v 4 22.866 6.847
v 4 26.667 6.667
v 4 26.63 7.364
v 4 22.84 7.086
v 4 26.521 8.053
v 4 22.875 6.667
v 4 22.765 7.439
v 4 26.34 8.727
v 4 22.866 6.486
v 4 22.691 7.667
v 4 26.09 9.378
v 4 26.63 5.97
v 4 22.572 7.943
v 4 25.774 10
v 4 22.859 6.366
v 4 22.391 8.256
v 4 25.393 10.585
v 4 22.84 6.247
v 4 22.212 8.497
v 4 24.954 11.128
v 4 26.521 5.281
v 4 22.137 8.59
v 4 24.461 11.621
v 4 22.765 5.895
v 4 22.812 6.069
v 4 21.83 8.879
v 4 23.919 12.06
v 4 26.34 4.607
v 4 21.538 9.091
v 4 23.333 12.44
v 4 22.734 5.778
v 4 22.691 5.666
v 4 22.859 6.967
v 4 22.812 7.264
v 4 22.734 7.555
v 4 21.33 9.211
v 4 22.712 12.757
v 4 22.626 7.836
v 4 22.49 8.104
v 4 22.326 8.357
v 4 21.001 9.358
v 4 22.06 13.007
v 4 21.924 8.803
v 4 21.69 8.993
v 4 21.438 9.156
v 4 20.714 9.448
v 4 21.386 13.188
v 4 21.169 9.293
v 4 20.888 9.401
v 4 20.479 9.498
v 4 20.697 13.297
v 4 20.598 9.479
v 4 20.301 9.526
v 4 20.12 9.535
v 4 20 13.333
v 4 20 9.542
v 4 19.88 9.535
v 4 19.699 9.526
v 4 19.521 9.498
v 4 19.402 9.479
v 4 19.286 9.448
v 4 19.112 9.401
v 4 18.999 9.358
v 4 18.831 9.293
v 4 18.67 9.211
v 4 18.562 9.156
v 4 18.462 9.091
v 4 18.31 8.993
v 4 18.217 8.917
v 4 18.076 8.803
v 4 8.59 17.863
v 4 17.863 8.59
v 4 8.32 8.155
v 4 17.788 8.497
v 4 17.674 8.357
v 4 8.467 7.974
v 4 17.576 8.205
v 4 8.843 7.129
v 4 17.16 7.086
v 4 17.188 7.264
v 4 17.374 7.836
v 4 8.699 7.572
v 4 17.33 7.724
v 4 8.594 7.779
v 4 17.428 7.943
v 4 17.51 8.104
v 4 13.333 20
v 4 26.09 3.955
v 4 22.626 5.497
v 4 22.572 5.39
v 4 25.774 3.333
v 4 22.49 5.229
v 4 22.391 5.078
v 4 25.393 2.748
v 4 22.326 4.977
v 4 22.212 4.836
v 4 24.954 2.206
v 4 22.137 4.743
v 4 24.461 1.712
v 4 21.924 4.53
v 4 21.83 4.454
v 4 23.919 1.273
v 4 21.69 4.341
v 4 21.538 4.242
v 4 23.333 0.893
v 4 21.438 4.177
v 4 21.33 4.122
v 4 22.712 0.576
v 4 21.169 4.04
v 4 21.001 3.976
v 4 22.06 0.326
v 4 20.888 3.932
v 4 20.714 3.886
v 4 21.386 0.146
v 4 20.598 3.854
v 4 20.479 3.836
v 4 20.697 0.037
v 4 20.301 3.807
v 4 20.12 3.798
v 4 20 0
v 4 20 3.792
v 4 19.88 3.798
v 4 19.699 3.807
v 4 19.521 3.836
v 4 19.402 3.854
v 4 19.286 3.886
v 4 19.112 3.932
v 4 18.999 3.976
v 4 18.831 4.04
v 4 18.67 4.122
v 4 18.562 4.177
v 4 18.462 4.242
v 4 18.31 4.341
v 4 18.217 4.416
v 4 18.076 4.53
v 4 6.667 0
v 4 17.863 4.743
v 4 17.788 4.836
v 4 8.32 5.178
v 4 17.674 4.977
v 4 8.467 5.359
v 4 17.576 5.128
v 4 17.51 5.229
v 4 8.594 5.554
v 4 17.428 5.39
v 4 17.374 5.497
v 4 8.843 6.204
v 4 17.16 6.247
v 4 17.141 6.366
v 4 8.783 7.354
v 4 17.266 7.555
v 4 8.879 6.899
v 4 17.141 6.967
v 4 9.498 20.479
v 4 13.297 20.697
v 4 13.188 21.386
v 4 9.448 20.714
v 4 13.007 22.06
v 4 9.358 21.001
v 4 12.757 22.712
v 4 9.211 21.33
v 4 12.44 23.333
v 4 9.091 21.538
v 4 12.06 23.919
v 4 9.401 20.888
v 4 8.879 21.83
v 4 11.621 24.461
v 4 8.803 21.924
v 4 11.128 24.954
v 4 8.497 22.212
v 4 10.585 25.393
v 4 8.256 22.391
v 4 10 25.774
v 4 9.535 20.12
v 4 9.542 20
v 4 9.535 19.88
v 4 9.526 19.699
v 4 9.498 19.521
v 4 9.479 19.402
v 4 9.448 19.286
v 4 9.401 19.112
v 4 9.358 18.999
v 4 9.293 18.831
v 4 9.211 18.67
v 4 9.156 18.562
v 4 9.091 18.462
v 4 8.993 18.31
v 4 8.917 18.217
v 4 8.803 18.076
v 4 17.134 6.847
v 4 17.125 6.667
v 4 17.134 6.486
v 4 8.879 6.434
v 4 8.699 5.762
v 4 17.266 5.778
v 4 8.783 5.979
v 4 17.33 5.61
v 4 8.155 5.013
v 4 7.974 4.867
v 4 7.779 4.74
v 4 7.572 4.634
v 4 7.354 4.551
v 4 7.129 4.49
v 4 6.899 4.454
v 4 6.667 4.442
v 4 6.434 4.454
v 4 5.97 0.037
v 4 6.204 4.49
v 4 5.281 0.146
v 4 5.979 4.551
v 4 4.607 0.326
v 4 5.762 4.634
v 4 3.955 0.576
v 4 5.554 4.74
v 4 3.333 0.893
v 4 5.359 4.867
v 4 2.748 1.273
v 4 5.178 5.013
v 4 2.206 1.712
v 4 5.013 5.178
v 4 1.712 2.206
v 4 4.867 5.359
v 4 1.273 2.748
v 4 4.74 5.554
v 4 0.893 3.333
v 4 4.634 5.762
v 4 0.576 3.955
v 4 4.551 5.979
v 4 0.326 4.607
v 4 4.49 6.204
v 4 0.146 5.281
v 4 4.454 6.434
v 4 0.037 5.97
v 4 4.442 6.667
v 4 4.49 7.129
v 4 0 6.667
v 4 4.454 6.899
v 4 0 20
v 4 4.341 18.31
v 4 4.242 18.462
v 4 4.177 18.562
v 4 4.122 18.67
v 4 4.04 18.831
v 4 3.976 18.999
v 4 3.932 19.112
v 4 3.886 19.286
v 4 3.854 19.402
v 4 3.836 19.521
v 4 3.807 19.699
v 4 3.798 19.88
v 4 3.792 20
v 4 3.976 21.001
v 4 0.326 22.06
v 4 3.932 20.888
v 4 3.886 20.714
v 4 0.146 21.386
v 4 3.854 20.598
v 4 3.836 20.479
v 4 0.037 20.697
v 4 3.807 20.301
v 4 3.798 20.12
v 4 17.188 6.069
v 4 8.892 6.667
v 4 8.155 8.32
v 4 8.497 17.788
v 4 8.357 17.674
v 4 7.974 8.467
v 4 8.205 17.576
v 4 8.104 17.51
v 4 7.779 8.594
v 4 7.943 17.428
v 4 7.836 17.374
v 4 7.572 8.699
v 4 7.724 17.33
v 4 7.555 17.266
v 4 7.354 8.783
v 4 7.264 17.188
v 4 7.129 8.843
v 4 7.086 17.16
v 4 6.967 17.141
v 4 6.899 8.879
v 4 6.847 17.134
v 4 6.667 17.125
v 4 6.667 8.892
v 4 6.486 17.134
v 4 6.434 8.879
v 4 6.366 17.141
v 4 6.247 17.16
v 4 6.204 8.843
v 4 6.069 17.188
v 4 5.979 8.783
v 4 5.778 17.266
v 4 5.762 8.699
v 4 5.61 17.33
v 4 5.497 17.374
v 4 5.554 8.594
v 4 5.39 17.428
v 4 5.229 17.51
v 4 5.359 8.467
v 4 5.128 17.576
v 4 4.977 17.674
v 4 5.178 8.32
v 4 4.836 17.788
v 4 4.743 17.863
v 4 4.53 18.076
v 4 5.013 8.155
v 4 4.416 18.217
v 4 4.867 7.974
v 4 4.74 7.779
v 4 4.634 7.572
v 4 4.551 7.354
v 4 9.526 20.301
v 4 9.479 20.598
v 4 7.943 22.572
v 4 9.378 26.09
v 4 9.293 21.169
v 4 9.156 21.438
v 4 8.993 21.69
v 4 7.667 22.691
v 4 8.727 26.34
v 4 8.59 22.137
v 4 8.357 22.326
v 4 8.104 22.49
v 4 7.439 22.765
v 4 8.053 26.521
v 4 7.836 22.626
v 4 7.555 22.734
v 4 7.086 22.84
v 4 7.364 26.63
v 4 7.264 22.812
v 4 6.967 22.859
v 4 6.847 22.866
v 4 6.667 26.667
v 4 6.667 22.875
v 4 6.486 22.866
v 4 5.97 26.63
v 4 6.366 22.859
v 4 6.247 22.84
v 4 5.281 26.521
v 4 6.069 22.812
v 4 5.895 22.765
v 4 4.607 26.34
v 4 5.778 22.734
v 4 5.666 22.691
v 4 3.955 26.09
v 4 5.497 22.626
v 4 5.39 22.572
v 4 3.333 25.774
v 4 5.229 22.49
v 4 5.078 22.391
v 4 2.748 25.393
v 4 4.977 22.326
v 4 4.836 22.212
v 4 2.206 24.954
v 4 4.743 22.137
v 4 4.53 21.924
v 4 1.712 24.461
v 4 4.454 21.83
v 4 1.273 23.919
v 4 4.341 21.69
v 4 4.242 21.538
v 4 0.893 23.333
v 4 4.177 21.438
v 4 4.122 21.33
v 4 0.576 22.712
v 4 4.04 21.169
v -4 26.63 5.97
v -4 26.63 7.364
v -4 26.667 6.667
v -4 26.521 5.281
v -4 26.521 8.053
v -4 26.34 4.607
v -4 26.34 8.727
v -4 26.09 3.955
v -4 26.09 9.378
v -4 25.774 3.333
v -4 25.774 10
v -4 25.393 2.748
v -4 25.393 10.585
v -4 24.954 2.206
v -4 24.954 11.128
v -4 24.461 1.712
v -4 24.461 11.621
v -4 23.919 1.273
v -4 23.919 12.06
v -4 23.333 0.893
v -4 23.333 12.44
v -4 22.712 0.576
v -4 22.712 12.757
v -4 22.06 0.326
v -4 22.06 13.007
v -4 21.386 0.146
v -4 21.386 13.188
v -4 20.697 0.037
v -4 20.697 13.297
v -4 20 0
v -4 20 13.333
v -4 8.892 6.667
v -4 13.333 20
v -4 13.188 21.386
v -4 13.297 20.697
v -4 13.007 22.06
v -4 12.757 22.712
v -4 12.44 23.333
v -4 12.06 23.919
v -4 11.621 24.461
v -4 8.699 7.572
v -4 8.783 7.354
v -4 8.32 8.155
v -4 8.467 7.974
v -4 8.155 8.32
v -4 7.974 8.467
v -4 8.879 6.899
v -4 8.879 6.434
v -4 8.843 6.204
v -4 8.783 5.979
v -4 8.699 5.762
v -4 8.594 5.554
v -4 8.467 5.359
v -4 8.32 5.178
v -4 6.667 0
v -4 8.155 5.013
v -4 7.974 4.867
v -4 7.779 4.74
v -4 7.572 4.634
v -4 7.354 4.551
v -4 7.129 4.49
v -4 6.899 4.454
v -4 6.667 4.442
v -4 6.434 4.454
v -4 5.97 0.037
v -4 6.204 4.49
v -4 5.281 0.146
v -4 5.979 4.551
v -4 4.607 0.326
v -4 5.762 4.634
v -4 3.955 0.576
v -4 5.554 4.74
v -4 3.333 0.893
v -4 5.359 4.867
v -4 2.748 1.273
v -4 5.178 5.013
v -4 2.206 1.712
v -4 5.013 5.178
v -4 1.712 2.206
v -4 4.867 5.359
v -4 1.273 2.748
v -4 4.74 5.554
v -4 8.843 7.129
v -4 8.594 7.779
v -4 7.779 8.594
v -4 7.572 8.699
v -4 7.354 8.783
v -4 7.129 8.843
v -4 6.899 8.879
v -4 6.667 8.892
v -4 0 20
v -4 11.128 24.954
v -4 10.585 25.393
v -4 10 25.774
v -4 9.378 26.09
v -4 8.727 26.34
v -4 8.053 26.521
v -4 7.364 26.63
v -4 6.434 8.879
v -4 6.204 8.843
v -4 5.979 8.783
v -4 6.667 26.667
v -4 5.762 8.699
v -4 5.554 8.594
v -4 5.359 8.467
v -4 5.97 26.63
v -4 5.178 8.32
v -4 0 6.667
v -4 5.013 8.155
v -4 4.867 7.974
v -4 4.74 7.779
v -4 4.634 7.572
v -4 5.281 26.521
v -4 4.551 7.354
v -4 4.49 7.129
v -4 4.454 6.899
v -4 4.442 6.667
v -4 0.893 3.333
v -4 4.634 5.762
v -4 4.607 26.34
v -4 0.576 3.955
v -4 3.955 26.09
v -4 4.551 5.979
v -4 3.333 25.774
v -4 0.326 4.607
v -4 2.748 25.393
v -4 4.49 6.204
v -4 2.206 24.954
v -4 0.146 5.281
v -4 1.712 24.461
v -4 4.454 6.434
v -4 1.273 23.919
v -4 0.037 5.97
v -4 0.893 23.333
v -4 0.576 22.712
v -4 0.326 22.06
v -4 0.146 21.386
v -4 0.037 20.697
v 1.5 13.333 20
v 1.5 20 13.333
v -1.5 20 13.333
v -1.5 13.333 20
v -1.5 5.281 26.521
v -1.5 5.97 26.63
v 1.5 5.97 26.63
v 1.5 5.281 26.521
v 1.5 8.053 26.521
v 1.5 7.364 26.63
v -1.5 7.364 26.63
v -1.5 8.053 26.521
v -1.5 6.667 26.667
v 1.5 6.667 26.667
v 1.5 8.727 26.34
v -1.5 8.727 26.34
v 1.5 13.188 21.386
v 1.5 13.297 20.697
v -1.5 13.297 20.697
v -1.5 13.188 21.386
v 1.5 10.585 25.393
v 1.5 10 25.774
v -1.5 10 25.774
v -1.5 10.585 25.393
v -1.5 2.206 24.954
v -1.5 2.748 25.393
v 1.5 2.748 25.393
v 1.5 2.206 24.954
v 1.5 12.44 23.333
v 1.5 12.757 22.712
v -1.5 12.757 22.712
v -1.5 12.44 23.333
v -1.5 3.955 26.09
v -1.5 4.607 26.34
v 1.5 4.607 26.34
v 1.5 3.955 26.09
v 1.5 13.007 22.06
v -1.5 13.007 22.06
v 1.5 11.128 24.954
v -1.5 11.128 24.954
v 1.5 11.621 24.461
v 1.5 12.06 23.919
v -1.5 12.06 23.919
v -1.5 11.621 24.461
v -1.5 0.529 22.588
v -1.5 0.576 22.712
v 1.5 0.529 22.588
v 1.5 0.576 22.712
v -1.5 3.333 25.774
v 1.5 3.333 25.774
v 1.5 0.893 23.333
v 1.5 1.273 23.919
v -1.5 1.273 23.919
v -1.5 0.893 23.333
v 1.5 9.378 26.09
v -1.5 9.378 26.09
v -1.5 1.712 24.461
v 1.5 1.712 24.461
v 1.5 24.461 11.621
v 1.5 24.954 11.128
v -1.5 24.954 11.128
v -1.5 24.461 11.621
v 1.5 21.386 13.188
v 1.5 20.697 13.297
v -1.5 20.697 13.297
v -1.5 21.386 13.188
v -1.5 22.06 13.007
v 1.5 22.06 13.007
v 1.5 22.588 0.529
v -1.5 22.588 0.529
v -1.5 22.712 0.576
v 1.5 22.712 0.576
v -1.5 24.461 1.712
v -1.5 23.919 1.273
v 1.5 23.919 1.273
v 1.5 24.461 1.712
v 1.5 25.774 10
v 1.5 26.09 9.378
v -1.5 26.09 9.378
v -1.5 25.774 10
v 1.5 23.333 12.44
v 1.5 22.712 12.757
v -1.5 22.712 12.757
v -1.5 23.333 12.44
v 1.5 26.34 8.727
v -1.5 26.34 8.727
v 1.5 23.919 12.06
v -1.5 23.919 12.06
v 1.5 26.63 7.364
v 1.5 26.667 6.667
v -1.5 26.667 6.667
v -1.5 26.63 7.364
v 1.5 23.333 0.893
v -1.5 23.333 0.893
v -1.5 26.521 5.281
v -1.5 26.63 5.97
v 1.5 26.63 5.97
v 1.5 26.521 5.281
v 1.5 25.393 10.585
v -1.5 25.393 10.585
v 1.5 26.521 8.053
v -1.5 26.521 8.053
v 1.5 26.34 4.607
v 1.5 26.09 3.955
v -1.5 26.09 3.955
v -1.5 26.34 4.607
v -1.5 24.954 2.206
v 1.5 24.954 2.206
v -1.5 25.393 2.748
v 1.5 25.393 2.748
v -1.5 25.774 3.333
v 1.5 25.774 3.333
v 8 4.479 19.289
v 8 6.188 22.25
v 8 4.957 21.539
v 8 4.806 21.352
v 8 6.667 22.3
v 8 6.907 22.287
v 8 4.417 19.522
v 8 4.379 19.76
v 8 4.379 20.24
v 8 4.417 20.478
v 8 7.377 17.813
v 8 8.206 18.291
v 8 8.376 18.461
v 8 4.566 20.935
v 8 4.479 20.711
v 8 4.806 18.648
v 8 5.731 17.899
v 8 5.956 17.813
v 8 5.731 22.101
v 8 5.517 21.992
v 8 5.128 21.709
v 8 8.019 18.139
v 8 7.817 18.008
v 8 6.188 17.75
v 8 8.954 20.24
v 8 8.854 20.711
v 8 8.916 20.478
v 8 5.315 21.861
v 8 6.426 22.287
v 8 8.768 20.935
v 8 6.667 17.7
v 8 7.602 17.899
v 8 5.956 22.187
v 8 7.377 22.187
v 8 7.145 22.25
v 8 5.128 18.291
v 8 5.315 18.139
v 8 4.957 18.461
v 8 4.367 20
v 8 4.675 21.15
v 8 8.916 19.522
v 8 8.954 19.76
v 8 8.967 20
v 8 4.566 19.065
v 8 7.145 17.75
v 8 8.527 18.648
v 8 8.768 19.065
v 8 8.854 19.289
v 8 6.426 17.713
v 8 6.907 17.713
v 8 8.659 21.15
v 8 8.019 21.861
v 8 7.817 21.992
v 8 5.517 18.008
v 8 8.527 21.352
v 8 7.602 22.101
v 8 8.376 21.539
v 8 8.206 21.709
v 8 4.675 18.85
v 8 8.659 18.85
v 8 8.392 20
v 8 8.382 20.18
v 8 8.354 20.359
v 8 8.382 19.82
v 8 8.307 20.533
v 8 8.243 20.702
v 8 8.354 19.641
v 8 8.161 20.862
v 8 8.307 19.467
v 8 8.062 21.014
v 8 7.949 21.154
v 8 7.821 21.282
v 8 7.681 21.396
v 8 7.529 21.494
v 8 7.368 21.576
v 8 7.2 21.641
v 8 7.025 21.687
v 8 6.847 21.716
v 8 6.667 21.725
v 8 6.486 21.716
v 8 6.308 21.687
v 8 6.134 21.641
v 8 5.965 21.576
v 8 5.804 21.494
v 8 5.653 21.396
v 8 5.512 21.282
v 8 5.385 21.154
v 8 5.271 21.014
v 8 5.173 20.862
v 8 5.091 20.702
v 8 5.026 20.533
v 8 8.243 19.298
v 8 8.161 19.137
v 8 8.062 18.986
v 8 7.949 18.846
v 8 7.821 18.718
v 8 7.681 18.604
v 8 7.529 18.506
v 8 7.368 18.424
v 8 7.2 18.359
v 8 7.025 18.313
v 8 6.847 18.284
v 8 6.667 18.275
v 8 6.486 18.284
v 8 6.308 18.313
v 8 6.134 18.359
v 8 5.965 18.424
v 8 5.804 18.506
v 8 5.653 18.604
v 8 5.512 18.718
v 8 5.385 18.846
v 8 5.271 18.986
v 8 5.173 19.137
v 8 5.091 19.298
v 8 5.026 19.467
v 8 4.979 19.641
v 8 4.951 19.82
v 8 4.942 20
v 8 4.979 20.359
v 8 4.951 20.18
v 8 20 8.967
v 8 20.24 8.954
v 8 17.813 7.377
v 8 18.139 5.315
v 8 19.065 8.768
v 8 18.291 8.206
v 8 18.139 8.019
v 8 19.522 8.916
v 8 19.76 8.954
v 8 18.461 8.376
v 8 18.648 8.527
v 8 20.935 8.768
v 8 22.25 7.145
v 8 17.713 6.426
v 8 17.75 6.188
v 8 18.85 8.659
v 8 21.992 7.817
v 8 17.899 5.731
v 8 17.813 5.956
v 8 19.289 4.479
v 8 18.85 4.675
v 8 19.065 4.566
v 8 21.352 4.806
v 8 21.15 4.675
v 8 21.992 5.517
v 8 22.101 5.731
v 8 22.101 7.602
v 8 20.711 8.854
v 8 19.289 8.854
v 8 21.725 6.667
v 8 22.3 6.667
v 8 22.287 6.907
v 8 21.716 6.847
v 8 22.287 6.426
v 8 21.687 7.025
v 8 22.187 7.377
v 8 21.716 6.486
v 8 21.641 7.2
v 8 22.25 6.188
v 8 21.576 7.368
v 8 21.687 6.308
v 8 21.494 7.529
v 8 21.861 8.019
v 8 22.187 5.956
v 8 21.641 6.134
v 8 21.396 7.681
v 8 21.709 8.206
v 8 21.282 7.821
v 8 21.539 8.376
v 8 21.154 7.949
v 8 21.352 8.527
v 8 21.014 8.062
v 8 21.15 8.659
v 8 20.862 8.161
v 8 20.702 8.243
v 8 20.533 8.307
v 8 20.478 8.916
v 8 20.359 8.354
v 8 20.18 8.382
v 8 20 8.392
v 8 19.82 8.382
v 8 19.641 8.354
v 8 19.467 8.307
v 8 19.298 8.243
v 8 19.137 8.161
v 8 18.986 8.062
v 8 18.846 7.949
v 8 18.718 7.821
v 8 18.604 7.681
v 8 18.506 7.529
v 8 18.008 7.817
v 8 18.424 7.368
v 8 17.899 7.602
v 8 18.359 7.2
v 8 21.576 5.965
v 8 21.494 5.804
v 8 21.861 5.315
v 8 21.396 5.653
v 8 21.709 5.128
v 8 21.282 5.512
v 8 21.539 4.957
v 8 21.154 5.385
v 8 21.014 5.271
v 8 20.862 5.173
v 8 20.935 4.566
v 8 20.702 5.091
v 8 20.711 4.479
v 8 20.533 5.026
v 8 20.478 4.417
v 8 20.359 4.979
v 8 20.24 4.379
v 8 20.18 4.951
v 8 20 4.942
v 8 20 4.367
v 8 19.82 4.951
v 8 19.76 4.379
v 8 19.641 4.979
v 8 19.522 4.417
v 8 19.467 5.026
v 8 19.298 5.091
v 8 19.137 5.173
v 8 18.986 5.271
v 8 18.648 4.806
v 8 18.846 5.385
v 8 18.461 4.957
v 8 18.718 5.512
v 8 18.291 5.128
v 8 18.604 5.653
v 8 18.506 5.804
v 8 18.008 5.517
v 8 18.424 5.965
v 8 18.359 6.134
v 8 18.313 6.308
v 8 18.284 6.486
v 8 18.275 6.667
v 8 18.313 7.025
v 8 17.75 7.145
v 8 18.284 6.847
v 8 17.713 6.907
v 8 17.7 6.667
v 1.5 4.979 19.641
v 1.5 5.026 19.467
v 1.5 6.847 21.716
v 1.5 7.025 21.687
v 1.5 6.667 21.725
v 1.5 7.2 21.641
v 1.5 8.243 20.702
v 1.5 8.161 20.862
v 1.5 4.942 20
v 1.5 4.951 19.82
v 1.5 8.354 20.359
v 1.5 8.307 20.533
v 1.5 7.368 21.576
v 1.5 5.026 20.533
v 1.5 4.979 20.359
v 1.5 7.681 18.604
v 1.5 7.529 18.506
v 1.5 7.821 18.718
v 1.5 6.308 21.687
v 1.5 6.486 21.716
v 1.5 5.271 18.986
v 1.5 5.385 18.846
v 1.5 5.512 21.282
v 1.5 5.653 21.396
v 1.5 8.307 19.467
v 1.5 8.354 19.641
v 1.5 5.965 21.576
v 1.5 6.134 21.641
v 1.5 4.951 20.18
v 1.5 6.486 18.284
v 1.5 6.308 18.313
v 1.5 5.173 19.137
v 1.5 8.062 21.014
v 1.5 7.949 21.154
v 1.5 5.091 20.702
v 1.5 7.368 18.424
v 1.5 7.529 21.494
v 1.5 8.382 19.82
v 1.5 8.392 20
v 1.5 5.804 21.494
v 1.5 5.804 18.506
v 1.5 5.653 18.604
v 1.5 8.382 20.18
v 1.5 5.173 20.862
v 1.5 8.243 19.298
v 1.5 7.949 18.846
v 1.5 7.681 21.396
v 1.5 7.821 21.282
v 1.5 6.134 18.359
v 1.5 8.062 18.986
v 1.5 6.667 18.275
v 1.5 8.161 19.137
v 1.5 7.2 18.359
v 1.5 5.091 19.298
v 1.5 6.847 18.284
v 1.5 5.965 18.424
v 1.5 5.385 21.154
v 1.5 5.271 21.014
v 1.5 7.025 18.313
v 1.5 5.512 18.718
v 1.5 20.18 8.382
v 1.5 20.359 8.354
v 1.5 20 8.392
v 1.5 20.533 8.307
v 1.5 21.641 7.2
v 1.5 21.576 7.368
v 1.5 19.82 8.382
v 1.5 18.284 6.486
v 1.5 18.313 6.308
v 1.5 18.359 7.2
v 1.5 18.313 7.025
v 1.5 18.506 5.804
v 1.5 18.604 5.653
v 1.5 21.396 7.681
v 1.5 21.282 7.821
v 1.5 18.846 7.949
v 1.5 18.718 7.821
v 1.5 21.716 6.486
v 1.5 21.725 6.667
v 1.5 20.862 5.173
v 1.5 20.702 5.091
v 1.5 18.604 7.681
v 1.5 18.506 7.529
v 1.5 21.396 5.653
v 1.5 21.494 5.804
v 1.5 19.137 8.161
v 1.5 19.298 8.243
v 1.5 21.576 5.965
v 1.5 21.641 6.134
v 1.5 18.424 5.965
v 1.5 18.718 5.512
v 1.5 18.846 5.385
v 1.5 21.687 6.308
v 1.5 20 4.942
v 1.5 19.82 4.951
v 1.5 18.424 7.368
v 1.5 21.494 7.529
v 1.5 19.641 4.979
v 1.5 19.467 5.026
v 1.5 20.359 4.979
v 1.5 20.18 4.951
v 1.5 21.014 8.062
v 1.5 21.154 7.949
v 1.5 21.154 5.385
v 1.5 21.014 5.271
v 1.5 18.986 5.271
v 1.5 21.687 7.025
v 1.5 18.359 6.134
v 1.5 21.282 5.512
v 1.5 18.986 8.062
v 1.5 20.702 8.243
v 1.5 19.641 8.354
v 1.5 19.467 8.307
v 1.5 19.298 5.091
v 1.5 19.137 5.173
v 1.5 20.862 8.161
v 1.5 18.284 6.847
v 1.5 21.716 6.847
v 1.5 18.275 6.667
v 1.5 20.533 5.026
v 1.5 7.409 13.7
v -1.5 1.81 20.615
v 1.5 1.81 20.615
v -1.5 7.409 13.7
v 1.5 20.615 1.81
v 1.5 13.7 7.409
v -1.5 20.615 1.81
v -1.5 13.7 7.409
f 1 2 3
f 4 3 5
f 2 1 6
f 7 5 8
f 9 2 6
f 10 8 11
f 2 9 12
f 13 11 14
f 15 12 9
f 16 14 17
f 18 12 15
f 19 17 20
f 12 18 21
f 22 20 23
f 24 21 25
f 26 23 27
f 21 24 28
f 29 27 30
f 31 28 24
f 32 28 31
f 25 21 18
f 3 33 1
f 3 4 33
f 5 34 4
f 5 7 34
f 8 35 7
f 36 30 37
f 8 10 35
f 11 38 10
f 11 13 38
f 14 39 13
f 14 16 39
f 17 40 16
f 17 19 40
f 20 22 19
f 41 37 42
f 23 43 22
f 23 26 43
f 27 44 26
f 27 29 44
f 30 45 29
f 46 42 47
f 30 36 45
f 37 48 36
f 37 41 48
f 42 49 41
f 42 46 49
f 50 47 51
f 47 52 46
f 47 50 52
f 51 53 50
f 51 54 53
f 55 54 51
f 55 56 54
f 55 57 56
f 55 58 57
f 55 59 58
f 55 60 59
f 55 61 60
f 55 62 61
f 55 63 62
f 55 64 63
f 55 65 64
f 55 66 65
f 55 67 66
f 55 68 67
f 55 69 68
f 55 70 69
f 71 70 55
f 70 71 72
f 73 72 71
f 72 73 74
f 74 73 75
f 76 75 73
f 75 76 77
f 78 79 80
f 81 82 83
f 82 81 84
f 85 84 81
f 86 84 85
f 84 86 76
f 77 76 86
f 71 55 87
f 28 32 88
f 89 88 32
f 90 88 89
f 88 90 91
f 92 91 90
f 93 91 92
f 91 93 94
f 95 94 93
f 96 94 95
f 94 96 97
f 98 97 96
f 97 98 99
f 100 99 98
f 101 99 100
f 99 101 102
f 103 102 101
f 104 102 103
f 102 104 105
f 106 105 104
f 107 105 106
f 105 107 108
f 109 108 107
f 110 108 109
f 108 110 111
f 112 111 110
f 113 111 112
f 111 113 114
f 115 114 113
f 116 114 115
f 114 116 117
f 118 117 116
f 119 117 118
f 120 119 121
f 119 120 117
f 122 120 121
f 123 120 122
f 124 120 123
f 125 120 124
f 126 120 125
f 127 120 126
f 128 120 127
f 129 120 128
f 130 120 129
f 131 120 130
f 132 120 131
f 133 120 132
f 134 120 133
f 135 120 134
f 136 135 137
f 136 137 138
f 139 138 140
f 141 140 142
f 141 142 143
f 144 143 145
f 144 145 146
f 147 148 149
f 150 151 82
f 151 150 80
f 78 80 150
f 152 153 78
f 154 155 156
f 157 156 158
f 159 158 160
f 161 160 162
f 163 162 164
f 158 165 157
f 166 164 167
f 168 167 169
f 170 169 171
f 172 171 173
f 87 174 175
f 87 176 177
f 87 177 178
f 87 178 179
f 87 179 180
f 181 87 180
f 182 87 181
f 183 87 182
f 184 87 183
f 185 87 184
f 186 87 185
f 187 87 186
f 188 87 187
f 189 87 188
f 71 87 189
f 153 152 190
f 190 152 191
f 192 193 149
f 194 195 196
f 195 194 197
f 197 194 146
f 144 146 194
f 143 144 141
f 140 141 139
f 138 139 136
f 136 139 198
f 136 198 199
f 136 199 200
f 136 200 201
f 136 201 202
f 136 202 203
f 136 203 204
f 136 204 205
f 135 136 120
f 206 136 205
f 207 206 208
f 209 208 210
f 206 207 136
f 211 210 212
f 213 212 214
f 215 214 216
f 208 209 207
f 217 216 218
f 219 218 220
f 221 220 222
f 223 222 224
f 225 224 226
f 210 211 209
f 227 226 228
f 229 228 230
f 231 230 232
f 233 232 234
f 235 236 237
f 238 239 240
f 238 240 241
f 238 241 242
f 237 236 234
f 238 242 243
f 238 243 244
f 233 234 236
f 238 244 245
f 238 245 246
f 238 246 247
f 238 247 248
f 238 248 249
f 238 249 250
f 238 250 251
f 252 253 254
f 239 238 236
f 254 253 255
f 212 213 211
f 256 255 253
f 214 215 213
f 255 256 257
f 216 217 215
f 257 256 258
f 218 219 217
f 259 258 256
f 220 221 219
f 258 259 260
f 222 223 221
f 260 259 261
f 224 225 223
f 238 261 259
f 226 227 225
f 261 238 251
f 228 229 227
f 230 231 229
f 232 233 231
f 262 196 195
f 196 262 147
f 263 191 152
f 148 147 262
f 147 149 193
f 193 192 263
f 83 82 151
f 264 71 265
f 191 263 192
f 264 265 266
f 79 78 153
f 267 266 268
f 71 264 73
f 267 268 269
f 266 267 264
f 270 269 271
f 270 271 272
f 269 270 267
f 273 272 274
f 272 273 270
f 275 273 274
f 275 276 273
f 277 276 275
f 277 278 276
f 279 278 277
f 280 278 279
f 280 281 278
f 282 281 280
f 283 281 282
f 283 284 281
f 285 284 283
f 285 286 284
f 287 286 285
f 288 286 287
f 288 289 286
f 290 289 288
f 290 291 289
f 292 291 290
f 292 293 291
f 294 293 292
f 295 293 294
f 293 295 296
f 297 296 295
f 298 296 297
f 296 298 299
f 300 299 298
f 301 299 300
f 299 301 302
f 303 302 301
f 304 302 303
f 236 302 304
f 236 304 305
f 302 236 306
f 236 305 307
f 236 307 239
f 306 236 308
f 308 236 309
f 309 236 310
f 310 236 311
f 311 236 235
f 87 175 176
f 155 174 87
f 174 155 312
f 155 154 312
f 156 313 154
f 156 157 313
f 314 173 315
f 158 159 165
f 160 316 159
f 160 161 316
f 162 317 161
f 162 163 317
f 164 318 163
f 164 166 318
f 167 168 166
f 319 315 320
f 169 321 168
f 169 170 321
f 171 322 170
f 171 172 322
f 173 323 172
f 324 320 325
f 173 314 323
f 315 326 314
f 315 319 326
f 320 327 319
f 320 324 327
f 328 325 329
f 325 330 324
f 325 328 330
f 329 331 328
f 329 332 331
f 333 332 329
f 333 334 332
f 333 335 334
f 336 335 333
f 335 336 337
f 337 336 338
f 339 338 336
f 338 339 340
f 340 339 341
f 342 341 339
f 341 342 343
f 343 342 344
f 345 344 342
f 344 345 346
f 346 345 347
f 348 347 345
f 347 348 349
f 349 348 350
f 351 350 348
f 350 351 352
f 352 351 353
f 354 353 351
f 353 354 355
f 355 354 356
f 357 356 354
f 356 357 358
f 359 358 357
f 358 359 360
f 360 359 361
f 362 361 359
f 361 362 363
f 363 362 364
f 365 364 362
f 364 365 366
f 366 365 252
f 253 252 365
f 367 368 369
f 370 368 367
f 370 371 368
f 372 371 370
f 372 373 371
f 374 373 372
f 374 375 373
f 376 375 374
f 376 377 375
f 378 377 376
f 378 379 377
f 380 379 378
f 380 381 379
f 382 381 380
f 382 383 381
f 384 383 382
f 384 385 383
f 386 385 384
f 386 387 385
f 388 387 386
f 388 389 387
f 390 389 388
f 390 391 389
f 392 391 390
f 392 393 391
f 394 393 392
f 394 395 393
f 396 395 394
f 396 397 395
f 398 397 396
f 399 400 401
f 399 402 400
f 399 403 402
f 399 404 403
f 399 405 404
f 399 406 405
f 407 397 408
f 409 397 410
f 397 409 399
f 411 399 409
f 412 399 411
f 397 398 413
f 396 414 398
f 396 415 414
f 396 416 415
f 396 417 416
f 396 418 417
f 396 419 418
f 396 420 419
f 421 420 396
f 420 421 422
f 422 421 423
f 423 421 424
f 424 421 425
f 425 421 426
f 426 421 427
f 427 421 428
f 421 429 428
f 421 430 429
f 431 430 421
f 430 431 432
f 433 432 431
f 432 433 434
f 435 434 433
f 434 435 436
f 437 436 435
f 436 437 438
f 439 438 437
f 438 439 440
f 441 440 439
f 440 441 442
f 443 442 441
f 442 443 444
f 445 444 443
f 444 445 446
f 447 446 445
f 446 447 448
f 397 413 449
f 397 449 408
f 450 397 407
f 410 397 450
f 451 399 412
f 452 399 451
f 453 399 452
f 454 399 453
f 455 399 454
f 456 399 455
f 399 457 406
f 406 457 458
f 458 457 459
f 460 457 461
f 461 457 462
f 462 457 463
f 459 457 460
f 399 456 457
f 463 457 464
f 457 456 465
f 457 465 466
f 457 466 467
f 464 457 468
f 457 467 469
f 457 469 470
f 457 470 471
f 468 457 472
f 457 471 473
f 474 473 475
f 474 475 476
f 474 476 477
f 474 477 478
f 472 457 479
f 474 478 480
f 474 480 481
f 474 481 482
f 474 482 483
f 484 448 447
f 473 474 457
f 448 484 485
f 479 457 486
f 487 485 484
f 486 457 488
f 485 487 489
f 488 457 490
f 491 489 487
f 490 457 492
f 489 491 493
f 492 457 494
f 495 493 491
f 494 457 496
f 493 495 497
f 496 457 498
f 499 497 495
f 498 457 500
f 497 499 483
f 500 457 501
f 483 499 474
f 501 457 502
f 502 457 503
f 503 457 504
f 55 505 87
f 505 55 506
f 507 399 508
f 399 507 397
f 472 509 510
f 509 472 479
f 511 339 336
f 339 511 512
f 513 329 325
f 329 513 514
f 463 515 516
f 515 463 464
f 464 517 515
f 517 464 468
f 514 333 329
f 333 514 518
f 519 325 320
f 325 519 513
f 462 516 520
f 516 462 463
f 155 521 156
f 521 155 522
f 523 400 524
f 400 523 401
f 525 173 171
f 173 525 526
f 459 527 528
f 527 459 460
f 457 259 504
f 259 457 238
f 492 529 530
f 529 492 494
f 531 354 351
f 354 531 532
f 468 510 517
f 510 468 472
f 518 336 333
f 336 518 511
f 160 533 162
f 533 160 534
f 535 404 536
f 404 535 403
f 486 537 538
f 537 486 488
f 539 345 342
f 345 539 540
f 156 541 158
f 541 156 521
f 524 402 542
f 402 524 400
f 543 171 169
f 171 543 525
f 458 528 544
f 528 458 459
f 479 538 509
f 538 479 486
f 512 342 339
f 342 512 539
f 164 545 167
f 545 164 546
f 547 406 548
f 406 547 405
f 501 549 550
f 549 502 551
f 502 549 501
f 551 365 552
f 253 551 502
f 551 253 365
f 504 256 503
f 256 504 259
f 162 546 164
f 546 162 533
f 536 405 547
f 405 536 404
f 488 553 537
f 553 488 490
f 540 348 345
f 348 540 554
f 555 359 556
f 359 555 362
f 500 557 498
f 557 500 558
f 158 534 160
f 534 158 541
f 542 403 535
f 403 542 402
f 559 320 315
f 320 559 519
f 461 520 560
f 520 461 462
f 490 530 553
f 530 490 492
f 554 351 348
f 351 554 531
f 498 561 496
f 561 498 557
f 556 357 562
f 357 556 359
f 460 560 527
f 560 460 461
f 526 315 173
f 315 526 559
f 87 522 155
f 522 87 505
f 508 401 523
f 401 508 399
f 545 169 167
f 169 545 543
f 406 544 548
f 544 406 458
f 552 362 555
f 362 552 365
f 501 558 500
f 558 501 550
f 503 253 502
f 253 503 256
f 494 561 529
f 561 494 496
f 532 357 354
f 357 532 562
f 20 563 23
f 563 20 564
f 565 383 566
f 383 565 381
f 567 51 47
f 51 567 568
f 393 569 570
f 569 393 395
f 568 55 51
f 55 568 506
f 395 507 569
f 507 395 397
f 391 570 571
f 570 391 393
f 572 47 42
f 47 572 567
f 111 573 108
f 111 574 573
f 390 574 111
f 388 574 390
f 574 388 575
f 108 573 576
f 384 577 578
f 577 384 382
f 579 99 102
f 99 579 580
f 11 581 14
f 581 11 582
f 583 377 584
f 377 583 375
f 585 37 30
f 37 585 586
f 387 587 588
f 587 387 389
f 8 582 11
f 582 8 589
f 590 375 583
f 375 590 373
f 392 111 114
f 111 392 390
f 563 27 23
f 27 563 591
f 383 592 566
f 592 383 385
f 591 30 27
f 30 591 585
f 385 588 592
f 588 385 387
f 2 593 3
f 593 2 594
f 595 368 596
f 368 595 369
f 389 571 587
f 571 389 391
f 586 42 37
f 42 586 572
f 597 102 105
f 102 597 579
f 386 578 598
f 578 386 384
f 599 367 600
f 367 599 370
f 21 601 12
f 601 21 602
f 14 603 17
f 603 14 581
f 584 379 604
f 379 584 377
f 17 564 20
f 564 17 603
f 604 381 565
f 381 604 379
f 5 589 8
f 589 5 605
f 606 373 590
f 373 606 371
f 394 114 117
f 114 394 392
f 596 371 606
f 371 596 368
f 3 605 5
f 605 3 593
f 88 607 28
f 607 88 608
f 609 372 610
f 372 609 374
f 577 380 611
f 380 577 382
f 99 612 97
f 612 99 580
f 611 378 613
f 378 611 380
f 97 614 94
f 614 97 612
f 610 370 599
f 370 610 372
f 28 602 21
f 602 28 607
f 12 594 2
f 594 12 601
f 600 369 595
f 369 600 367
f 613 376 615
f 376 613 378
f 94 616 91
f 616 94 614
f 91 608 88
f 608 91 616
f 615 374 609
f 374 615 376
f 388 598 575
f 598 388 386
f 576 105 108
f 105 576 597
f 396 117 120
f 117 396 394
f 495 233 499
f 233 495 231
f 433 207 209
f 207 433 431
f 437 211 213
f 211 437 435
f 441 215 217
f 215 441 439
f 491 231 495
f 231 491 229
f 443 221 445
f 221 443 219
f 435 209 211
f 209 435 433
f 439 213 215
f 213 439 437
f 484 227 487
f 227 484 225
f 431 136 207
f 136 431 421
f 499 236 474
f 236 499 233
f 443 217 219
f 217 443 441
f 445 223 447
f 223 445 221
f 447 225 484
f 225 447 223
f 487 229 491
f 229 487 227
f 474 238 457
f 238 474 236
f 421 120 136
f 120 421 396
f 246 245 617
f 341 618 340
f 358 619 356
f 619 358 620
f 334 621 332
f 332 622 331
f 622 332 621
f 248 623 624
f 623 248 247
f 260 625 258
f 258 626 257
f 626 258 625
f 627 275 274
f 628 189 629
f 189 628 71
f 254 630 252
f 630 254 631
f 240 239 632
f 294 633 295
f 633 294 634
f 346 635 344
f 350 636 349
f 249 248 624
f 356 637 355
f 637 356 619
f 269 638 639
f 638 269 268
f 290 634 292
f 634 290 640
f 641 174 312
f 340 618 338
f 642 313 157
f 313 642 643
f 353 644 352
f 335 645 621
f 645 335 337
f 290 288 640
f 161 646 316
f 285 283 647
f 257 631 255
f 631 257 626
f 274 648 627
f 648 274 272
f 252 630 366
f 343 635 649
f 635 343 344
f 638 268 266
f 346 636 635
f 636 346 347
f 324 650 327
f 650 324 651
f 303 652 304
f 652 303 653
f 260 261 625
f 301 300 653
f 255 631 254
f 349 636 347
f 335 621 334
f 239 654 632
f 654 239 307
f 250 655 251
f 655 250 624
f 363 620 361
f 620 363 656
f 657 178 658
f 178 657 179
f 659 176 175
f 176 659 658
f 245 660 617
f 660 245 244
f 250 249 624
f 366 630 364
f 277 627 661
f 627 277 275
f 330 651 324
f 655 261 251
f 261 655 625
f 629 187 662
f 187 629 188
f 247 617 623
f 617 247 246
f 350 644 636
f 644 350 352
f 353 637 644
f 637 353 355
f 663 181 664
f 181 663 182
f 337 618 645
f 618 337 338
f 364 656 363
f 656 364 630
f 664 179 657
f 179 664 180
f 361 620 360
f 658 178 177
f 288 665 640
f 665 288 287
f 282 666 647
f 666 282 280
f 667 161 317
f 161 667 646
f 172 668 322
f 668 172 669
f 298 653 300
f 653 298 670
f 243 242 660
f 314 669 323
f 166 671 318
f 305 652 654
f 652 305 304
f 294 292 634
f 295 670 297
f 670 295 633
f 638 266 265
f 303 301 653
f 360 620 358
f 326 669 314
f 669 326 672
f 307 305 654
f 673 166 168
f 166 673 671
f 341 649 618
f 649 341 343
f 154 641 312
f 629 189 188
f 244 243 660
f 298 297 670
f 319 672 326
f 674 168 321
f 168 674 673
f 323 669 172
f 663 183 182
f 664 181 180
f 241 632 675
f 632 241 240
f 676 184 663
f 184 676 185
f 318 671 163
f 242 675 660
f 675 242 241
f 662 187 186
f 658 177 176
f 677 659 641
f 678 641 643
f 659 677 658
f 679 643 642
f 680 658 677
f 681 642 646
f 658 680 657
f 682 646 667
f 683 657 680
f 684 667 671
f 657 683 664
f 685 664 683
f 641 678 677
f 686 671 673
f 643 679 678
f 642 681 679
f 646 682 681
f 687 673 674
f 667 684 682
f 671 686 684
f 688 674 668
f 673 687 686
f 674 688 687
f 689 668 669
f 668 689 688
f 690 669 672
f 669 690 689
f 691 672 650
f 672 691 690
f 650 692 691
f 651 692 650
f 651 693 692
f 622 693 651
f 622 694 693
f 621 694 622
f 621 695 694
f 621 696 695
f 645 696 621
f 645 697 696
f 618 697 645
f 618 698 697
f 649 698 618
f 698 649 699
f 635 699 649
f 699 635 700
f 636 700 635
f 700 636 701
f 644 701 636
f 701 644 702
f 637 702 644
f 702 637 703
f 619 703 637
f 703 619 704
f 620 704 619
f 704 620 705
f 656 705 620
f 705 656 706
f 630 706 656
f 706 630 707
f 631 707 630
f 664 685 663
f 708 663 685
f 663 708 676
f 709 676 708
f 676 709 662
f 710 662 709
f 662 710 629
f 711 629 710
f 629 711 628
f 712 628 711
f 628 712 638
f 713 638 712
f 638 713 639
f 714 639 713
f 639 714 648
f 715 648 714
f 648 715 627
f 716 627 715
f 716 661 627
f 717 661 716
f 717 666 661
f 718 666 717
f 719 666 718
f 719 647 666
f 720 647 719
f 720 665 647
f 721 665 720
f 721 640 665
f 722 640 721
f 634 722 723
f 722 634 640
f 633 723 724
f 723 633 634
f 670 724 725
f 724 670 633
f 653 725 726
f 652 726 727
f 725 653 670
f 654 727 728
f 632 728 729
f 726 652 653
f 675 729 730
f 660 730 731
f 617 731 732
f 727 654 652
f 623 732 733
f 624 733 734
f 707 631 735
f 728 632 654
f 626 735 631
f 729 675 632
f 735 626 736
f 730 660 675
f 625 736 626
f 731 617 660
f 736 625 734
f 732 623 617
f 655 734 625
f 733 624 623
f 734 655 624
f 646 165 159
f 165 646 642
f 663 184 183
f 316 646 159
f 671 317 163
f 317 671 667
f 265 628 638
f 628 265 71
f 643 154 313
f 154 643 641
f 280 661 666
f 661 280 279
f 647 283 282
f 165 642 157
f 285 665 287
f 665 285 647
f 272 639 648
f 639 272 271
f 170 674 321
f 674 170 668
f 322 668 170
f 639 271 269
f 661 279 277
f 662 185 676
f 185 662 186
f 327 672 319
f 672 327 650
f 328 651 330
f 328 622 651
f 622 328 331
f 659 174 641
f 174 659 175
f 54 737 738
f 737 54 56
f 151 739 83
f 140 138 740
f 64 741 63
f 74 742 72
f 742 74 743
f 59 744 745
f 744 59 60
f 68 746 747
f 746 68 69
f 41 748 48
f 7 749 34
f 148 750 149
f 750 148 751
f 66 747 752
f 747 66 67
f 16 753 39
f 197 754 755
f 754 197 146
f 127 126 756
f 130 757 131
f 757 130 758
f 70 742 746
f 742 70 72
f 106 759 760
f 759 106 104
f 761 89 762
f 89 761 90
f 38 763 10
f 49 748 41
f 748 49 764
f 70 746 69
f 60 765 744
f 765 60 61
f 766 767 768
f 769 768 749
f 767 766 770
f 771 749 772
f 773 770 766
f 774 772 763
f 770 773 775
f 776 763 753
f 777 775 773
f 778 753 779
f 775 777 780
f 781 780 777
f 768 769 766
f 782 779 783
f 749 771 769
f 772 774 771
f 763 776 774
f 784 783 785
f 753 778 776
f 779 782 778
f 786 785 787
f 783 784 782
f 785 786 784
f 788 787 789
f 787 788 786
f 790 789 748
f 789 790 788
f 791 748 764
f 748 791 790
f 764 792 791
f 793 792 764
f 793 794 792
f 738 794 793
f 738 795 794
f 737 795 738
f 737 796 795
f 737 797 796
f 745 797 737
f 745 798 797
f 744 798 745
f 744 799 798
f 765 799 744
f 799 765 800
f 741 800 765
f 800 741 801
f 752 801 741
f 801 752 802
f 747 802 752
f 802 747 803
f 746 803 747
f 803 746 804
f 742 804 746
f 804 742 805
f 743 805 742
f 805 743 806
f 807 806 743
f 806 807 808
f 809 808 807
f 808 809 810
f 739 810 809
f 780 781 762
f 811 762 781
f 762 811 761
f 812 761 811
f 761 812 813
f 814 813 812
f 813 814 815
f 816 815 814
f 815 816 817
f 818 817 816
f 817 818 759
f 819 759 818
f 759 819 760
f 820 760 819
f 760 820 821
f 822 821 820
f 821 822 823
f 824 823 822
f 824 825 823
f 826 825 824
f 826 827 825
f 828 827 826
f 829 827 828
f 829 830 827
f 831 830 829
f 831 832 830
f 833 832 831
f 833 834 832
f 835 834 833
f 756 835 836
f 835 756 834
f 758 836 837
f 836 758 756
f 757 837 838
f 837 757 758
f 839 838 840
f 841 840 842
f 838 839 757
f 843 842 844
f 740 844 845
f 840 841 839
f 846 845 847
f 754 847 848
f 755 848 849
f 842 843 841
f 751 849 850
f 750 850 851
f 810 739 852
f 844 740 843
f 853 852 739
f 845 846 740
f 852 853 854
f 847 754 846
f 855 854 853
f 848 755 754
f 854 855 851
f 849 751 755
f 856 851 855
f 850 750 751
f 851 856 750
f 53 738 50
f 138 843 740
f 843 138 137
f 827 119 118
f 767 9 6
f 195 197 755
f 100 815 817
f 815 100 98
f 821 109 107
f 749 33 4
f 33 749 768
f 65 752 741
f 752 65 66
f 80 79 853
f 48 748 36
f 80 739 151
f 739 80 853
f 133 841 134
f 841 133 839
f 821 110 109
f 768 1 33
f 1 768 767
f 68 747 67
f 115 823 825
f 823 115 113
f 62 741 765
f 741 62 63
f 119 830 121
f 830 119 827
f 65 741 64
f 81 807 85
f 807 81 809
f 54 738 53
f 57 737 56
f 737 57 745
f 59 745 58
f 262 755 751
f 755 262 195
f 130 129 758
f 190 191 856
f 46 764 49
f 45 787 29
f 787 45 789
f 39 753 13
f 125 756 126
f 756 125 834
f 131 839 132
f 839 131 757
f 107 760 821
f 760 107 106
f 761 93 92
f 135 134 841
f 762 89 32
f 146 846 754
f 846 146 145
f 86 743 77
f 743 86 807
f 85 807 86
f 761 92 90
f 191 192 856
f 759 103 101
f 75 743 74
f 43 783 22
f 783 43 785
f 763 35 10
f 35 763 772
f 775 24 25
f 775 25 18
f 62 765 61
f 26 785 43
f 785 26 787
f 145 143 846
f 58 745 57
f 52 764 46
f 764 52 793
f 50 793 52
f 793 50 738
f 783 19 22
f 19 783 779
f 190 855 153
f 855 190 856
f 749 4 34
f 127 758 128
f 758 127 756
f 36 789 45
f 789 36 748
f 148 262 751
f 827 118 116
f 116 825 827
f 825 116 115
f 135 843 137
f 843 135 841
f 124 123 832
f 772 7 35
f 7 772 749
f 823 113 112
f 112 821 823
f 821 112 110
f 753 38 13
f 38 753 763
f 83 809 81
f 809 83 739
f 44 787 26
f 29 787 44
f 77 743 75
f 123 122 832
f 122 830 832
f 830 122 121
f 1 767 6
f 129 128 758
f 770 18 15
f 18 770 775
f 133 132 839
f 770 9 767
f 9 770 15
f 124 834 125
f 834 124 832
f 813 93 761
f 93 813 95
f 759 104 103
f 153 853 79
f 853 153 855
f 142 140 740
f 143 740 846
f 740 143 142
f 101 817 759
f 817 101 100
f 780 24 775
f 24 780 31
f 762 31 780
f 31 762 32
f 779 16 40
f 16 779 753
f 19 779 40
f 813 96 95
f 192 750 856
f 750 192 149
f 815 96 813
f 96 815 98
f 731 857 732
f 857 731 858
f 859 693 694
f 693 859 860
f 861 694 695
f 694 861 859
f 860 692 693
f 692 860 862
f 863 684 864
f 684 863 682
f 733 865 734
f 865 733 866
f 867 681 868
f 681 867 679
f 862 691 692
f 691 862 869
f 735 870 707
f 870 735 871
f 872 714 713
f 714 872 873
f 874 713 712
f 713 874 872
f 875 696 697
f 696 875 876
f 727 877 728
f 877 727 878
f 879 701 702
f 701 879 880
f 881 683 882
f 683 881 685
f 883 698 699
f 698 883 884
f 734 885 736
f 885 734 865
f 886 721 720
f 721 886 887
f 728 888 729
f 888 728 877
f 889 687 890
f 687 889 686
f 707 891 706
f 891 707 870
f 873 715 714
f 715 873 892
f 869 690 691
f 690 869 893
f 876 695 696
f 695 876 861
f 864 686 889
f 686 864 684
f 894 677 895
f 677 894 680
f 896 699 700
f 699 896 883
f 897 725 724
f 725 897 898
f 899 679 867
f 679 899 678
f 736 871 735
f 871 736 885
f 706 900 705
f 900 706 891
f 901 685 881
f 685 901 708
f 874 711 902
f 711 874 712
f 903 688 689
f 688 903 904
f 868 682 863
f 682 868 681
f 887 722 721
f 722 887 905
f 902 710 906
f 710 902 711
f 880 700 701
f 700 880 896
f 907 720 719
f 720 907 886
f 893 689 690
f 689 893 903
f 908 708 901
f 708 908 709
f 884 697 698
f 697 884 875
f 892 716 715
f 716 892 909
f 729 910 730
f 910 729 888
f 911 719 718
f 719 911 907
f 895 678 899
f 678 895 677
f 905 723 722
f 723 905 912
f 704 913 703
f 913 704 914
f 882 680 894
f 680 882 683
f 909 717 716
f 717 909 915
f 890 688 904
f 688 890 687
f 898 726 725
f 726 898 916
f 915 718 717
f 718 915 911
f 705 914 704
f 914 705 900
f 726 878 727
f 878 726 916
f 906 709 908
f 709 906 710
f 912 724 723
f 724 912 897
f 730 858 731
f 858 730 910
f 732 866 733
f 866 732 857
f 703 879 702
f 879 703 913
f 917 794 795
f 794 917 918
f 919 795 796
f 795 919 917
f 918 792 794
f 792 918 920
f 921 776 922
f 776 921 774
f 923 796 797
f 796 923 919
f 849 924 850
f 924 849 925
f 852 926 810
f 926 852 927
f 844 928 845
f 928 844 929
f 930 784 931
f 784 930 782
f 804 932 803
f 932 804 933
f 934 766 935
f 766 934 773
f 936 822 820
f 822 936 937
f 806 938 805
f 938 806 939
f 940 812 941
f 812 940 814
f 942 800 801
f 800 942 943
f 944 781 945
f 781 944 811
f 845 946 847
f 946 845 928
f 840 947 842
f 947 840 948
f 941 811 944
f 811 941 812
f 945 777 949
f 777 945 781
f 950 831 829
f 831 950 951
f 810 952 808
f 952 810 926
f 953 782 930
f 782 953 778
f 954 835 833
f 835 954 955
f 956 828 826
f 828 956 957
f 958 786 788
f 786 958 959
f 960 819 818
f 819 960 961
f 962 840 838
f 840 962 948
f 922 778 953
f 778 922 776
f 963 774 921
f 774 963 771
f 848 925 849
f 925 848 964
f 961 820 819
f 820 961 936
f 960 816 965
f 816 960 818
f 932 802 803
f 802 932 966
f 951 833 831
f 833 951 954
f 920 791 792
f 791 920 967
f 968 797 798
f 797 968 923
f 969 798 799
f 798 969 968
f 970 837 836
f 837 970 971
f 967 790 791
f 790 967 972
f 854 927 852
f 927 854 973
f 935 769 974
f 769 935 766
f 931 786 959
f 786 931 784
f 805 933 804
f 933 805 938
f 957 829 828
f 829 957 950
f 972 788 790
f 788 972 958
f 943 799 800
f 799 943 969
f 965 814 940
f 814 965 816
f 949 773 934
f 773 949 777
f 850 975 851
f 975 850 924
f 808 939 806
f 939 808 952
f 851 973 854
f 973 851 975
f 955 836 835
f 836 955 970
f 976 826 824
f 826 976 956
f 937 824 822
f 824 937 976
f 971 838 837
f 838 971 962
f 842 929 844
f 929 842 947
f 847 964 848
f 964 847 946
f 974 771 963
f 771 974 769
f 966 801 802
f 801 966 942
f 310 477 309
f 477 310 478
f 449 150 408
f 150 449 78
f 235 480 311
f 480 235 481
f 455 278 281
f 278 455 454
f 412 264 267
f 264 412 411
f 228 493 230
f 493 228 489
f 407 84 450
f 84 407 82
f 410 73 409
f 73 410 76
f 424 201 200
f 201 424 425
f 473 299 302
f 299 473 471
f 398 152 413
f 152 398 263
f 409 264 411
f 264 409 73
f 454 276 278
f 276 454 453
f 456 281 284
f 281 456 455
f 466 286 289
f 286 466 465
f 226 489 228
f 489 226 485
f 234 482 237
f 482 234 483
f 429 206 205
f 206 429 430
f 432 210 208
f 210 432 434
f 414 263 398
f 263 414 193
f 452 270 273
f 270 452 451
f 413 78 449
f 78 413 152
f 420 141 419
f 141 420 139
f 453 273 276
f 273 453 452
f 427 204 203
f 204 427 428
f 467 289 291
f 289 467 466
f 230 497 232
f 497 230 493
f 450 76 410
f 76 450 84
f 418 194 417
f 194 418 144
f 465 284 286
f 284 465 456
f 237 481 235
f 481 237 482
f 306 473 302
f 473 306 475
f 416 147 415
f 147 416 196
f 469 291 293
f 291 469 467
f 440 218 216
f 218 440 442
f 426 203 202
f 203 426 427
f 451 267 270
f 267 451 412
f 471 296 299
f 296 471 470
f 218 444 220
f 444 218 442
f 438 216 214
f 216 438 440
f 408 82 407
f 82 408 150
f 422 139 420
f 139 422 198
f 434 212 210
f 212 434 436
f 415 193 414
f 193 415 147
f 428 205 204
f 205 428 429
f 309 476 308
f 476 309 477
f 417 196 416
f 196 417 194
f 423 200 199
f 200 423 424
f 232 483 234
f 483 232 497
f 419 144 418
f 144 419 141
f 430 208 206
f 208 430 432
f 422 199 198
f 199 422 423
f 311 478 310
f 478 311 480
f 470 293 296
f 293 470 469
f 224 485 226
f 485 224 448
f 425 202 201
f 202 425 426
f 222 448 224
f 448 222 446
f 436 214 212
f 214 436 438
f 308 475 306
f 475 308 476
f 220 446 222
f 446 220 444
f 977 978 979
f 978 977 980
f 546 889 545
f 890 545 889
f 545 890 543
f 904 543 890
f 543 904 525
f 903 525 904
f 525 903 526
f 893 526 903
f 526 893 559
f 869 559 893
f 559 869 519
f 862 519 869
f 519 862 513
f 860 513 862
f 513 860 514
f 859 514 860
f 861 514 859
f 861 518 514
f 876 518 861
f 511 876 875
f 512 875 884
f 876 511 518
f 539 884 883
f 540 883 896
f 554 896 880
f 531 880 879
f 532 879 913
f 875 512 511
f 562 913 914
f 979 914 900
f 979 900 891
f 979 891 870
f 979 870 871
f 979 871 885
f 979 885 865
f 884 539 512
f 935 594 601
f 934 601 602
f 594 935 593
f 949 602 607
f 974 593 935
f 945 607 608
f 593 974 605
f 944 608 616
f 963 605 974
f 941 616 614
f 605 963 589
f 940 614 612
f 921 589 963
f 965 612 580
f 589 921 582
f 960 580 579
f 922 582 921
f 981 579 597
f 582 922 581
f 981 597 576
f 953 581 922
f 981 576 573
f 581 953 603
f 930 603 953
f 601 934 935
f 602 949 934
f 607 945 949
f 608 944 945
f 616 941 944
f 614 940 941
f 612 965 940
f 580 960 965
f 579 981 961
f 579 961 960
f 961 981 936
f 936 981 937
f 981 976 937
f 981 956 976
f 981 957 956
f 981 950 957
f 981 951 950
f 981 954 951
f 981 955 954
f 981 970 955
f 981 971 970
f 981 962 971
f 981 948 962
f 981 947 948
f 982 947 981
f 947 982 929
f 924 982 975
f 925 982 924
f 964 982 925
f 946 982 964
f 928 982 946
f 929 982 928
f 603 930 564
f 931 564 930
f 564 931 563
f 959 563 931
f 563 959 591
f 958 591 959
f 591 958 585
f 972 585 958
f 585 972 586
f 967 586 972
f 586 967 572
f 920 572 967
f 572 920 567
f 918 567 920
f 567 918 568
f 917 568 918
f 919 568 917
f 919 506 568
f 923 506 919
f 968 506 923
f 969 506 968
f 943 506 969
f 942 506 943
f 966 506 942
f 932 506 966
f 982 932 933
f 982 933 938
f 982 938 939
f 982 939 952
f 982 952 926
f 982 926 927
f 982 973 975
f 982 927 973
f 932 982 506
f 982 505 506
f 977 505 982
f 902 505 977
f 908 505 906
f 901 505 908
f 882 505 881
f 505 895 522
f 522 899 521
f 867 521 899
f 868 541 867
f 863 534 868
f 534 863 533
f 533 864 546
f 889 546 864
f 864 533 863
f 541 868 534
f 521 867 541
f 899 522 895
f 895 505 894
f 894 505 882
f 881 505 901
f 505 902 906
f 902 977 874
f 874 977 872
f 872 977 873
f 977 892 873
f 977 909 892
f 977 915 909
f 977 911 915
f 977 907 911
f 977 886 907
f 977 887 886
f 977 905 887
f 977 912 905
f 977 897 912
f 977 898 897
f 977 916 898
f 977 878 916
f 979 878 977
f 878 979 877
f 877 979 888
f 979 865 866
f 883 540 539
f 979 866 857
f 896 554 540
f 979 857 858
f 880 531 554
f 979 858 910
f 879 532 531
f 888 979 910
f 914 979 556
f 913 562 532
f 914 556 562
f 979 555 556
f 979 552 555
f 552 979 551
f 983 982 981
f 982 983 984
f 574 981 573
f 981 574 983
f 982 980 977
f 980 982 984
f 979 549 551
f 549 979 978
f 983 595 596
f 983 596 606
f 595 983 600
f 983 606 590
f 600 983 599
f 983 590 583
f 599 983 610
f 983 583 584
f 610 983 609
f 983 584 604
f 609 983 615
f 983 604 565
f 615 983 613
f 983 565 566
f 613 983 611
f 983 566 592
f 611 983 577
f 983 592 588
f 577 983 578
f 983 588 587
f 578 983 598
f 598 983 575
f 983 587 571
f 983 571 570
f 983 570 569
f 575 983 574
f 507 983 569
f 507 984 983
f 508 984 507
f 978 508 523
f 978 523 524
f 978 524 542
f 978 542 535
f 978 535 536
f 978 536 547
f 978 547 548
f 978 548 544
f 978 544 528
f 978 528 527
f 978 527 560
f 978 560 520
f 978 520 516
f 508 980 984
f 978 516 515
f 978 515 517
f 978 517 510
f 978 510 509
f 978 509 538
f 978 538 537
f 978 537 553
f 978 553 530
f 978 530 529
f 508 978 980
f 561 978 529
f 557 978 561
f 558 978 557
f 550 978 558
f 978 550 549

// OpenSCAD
// file: configuration.scad
// Increase this if your slicer or printer make holes too tight.
extra_radius = 0.1;

// OD = outside diameter, corner to corner.
m3_nut_od = 6.1;
m3_nut_radius = m3_nut_od/2 + 0.2 + extra_radius;
m3_washer_radius = 3.5 + extra_radius;

// Major diameter of metric 3mm thread.
m3_major = 2.85;
m3_radius = m3_major/2 + extra_radius;
m3_wide_radius = m3_major/2 + extra_radius + 0.2;

// NEMA17 stepper motors.
motor_shaft_diameter = 5;
motor_shaft_radius = motor_shaft_diameter/2 + extra_radius;

// Frame brackets. M3x8mm screws work best with 3.6 mm brackets.
thickness = 3.6;

// OpenBeam or Misumi. Currently only 15x15 mm, but there is a plan
// to make models more parametric and allow 20x20 mm in the future.
extrusion = 15;

// Placement for the NEMA17 stepper motors.
motor_offset = 44;
motor_length = 47;
// file: triangle.scad
//triangle.scad
/*         C
           .
          / \
       b /   \ a
        /     \
      A.-------.B
           c
   Triangle referenced in these modules:
   side c is the base opposite angle C
   b is the upper left side opposite angle B
   a is the upper right side opposite angle A
   angle A will be at the origin
	center moves the triangle down half its height
*/
// usage: rTriangle(center=true);
module rTriangle(c=8, b=4, h=1, center=false){
  rightTriangle(c, b, h, center);
}
module rightTriangle(c=3, b=4, h=1, center=false)
{// b is y, c is x 
  q = center==true ? 1 : 0;
  translate([0, 0, -q*h/2])
  linear_extrude(height=h)
  polygon(points=[[0,0],[0,b],[c,0]],paths=[[0,1,2]]);
}

// usage: hlTriangle(center=true);
module hlTriangle(hyp=8, leg=4, h=1, center=false){
  hypotenuseLegTriangle(hyp, leg, h, center);
}//leg is the y, s the x
module hypotenuseLegTriangle(hyp=5, leg=4, h=1, center=false){
  s=sqrt(hyp*hyp-leg*leg);
  rightTriangle(s, leg, h, center);
}

// usage: iTriangle(5,30,1,true);
module iTriangle(side=5, angle=30, h=1, center=false){
  isoscelesTriangle(side, angle, h, center);
}
module isoscelesTriangle(side=5, angle=30, h=1, center=false){// side is the length of the egual sides of the included angle
  q = center==true ? 1 : 0;
  baseAngle=(180-angle)/2;
  y=side*sin(baseAngle);
  x=2*side*sin(angle/2);

  translate([0, 0, -q*h/2])
  linear_extrude(height=h)
  polygon(points=[[0,0],[x/2,y],[x,0]],paths=[ [0,1,2] ]);
}

// usage: eTriangle(5,1,true);
module eTriangle(side=5, h=1, center=false){
  equilateralTriangle(side, h, center);
}//Equilateral triangle is special case isosceles triangle.
module equilateralTriangle(side=5, h=1, center=false){
  isoscelesTriangle(side, 60, h, center);
}

// usage: sasTriangle(center=true);
module sasTriangle(b=6, A=120, c=5, h=1, center=false){
  // c is the base of the triangle
  // b is the upper left side
  // A is the included A
  q = center==true ? 1 : 0;
  
  translate([0,0,-h/2*q])
  linear_extrude(height=h)
  if (A <= 90){
    polygon(points=[[0,0],[b*cos(A),b*sin(A)],[c,0]],paths=[ [0,1,2] ]);
  }else{ // > 90
    polygon(points=[[0,0],[-b*cos(180-A),b*sin(180-A)],[c,0]],paths=[[0,1,2]]);
  }
}

// usage: asaTriangle(center=true);
module asaTriangle(A=120, c=4, B=30, h=1, center=false){// arbitrarly the first angle is the left one upper of the 4 possible positions.
  C = 180 - A - B;//third angle opposite side c.
  // Law of sines: b/sin(B) = c/sin(C) so:
  b = c*sin(B)/sin(C);

  sasTriangle(b,A,c,h,center);  
}

// usage: sssTriangle(center=true);
module sssTriangle(a=6,b=3,c=8,h=1,center=false){
  // sum of a and b must be larger than c
  // law of cosines: 
  A = acos((b*b + c*c - a*a)/(2*b*c));

  sasTriangle(b,A,c,h,center);
}

//usage: trapezoid(center=true);
module trapezoid(th=6, tw=15, eh=10, alpha=60, center=false){
	/* regular trapezoid
	th=trapezoid height
   tw=trapezoid major side width
	eh=extrusion height
   alpha=degree measure of acute angles
   */
	// Included with triangles since a trapezoid is a truncated triangle...  ;)
	x=th/tan(alpha);

	if(center==true){
		translate([-tw/2,0,-eh/2])
		linear_extrude(height=eh) 
		polygon(points=[ [0,0],[x,th],[tw-x,th],[tw,0] ],
				  paths=[ [0,1,2,3] ]);
	} else {
		linear_extrude(height=eh) 
		polygon(points=[ [0,0],[x,th],[tw-x,th],[tw,0] ],
				  paths=[ [0,1,2,3] ]);
	}
}
// main file
include <triangle.scad>
include <configuration.scad>

plate_radius=170/2;
plate_height=3;
clip_lip=2;
offset_multiplier=1.33;
clip_thickness=clip_lip+plate_height*2;
triangle_side=20;
triangle_hypotenuse=triangle_side*sqrt(2);
corner_radius=triangle_side/3;

rotate([0,-90,0]){
translate([corner_radius,corner_radius,0]){
difference(){
union(){
sssTriangle(triangle_hypotenuse, triangle_side, triangle_side, clip_thickness, center=true);

translate([triangle_side*2/3, 0, -clip_thickness/2])
	cylinder(h=clip_thickness, r=corner_radius, $fn=60);

translate([0, triangle_side*2/3, -clip_thickness/2])
	cylinder(h=clip_thickness, r=corner_radius, $fn=60);

translate([0, 0, -clip_thickness/2])
	cylinder(h=clip_thickness, r=corner_radius, $fn=60);

translate([0, -corner_radius, -clip_thickness/2])
	cube([corner_radius*2, corner_radius, clip_thickness]);

translate([-corner_radius, 0, -clip_thickness/2])
	cube([corner_radius, corner_radius*2, clip_thickness]);

translate([triangle_side*2/3, 0, -clip_thickness])
	cylinder(h=clip_thickness, r2=m3_wide_radius*2, r1=m3_wide_radius+m3_wide_radius/3, $fn=60);

translate([0, triangle_side*2/3, -clip_thickness])
	cylinder(h=clip_thickness, r2=m3_wide_radius*2, r1=m3_wide_radius+m3_wide_radius/3, $fn=60);
}

translate([triangle_side*2/3, 0, -clip_thickness])
	cylinder(h=clip_thickness, r=m3_wide_radius, $fn=60);

translate([0, triangle_side*2/3, -clip_thickness])
	cylinder(h=clip_thickness, r=m3_wide_radius, $fn=60);

translate([0, 0, -clip_thickness/2])
	cylinder(h=clip_thickness, r=m3_wide_radius+.5, $fn=60);

translate([plate_radius/offset_multiplier, plate_radius/offset_multiplier, -plate_height/2])
	cylinder(h=plate_height, r=plate_radius, $fn=60);
}
}
}
